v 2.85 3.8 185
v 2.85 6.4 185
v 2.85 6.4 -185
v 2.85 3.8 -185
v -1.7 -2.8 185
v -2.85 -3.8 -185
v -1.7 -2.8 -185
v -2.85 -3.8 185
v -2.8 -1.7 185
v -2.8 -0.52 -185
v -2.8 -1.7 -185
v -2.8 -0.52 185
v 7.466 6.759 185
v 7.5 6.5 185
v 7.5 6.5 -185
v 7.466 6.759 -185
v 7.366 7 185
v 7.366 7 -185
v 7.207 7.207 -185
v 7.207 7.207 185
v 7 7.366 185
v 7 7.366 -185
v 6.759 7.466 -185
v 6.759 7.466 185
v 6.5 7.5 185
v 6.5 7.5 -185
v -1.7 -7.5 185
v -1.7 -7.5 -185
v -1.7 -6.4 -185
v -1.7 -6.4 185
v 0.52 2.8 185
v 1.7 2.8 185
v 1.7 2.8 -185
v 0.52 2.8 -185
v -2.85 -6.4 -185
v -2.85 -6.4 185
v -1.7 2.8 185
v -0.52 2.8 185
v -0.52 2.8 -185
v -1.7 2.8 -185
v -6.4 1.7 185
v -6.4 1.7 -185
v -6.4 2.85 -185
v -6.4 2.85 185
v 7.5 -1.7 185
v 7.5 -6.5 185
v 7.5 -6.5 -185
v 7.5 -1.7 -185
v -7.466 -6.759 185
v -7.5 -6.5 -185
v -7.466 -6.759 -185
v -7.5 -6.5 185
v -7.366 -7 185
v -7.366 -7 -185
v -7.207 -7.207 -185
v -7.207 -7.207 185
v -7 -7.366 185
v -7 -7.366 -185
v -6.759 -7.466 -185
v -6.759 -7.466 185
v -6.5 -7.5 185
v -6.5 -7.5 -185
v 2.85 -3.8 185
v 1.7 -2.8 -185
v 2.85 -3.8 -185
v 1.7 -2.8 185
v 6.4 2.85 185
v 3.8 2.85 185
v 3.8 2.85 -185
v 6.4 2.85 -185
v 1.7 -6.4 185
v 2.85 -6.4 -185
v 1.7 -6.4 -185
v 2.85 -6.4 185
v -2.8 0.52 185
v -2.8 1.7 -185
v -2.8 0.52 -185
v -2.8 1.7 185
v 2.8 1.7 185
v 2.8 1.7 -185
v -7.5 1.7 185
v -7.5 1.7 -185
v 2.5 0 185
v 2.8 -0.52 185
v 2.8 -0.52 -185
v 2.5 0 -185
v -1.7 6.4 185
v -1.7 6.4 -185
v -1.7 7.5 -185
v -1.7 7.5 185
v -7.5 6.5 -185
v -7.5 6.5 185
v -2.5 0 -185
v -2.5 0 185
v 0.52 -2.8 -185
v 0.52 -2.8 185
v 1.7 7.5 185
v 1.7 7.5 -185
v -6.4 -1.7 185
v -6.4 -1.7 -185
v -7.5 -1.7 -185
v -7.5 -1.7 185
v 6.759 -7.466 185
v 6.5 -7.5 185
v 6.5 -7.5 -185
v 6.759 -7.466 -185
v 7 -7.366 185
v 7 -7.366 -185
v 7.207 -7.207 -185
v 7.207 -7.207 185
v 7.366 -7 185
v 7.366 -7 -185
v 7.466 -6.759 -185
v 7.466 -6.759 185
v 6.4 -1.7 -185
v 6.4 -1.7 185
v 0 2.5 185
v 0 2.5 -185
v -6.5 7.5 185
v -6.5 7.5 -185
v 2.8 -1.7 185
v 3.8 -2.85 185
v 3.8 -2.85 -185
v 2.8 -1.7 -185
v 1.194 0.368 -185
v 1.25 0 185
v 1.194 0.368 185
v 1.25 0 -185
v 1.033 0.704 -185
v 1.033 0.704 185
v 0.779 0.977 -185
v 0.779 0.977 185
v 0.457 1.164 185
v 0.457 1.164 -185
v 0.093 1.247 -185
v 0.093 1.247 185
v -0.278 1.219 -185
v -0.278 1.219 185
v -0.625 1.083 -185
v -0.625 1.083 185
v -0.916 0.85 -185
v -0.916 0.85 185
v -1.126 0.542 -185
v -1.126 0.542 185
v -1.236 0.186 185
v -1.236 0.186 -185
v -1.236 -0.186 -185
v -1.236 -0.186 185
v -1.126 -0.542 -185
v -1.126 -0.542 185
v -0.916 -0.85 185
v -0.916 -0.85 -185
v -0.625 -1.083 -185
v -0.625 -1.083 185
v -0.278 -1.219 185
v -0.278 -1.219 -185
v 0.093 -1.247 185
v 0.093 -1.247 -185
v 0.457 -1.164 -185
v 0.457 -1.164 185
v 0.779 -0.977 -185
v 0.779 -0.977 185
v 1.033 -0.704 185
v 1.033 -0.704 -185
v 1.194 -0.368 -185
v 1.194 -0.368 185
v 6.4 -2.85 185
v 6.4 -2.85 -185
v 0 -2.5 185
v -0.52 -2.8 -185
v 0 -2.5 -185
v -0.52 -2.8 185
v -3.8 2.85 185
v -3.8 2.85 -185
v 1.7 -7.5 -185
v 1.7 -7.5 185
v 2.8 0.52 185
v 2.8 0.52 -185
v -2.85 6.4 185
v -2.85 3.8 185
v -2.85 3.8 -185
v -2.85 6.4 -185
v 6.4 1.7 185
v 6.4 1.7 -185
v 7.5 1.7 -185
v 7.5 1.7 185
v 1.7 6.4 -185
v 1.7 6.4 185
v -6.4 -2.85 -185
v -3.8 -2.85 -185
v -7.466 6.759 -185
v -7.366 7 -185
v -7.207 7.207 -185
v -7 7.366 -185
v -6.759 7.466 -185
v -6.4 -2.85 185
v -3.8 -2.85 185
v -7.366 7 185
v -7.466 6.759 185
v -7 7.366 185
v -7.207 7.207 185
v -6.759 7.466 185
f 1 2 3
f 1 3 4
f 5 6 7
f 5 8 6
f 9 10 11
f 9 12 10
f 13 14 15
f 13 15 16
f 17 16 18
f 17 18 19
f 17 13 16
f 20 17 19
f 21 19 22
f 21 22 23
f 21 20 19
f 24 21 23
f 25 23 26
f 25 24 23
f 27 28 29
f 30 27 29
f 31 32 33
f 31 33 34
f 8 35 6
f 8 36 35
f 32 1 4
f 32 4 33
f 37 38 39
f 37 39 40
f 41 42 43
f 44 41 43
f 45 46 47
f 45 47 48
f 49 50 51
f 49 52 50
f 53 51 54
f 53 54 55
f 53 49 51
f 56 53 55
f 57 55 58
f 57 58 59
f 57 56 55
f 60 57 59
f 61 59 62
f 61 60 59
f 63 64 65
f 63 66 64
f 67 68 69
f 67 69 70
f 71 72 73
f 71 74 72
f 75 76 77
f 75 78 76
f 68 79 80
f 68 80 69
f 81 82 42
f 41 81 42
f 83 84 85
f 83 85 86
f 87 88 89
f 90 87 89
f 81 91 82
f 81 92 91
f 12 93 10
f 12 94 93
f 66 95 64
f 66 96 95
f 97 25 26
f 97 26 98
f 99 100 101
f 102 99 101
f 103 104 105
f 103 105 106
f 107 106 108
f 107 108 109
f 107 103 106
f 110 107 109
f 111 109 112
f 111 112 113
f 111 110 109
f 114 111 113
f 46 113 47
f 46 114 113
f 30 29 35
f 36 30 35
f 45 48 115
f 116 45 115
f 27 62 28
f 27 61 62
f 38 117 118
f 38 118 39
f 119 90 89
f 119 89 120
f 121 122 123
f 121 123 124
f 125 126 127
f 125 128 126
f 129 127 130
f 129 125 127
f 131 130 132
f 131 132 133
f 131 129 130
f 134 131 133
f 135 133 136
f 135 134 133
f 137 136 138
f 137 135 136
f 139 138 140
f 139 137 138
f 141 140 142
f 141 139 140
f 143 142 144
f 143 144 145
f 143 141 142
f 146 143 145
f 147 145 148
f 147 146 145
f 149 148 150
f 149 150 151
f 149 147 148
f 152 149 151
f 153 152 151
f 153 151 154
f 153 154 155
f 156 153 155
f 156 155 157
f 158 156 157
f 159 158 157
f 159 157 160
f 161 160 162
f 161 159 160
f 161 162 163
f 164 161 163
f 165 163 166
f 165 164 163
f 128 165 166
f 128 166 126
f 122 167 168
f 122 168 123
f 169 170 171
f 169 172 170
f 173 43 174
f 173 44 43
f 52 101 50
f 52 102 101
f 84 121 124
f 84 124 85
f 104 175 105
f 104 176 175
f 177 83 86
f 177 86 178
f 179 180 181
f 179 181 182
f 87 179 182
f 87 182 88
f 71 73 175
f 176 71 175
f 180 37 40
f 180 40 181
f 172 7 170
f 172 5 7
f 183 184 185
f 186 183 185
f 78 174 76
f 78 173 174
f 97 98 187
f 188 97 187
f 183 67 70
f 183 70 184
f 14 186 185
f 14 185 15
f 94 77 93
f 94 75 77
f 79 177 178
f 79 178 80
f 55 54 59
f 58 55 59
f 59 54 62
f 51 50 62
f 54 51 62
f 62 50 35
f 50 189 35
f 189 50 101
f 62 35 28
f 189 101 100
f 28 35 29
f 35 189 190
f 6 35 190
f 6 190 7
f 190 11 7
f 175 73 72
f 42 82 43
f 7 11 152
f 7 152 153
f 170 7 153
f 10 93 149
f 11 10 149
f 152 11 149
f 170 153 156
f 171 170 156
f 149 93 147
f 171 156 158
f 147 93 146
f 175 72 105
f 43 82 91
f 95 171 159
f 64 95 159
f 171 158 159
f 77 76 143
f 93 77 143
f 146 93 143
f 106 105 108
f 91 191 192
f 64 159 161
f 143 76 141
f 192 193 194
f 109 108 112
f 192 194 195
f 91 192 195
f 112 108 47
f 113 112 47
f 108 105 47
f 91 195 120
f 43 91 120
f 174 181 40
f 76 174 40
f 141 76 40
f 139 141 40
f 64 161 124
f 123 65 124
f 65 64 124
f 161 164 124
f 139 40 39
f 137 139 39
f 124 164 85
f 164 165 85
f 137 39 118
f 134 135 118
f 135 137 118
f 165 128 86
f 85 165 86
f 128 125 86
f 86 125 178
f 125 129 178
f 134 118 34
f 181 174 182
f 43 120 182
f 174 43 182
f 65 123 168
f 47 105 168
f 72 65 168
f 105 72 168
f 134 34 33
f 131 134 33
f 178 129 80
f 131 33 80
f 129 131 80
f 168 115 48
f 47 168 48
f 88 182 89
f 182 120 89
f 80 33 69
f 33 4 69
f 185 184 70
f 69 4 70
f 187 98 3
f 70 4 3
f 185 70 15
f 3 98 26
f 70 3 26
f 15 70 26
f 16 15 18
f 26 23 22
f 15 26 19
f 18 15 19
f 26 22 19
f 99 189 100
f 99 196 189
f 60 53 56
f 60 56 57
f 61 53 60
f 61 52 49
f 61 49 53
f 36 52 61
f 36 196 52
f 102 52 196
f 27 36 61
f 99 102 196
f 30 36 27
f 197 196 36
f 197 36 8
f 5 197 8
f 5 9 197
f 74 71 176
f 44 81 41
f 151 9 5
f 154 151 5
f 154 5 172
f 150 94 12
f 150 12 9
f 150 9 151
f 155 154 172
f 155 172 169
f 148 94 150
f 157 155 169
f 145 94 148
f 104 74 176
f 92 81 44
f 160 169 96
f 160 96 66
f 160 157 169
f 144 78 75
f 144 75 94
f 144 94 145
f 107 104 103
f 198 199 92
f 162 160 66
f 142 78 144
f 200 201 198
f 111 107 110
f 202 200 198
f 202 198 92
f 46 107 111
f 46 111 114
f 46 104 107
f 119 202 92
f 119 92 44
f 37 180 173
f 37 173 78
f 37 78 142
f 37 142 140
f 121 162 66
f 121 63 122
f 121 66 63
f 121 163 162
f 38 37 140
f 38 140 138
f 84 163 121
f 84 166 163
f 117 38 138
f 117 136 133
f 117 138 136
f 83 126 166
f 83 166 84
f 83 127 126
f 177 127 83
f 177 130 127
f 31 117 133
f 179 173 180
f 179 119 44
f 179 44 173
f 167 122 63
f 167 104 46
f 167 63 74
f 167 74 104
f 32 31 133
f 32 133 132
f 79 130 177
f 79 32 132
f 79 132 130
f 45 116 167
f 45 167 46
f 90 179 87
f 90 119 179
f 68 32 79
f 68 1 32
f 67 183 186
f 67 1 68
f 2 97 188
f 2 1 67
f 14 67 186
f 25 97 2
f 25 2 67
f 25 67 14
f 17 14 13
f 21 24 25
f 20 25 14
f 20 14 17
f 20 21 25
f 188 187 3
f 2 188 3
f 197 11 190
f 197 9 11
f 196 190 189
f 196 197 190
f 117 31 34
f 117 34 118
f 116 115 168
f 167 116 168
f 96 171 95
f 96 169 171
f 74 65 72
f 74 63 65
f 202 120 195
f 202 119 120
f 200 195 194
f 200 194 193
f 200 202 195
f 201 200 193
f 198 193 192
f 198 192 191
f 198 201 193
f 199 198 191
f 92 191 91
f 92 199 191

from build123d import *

# Parameters (mm, degrees)
F0_R     = 1.25
F1_DEPTH = 185


with BuildPart() as f1:
    # F0 (on Top) → F1 (new body, symmetric)
    with BuildSketch(Plane.XY):
        with BuildLine():
            Line((1.7, -7.5), (6.5, -7.5))
            ThreePointArc((6.5, -7.5), (7.207107, -7.207107), (7.5, -6.5))
            Line((7.5, -6.5), (7.5, -1.7))
            Line((7.5, -1.7), (6.4, -1.7))
            Line((6.4, -1.7), (6.4, -2.85))
            Line((6.4, -2.85), (3.8, -2.85))
            Line((3.8, -2.85), (2.8, -1.7))
            Line((2.8, -1.7), (2.8, -0.519615))
            Line((2.8, -0.519615), (2.5, 0))
            Line((2.5, 0), (2.8, 0.519615))
            Line((2.8, 0.519615), (2.8, 1.7))
            Line((2.8, 1.7), (3.8, 2.85))
            Line((3.8, 2.85), (6.4, 2.85))
            Line((6.4, 2.85), (6.4, 1.7))
            Line((6.4, 1.7), (7.5, 1.7))
            Line((7.5, 1.7), (7.5, 6.5))
            ThreePointArc((7.5, 6.5), (7.207107, 7.207107), (6.5, 7.5))
            Line((6.5, 7.5), (1.7, 7.5))
            Line((1.7, 7.5), (1.7, 6.4))
            Line((1.7, 6.4), (2.85, 6.4))
            Line((2.85, 6.4), (2.85, 3.8))
            Line((2.85, 3.8), (1.7, 2.8))
            Line((1.7, 2.8), (0.519615, 2.8))
            Line((0.519615, 2.8), (0, 2.5))
            Line((0, 2.5), (-0.519615, 2.8))
            Line((-0.519615, 2.8), (-1.7, 2.8))
            Line((-1.7, 2.8), (-2.85, 3.8))
            Line((-2.85, 3.8), (-2.85, 6.4))
            Line((-2.85, 6.4), (-1.7, 6.4))
            Line((-1.7, 6.4), (-1.7, 7.5))
            Line((-1.7, 7.5), (-6.5, 7.5))
            ThreePointArc((-6.5, 7.5), (-7.207107, 7.207107), (-7.5, 6.5))
            Line((-7.5, 6.5), (-7.5, 1.7))
            Line((-7.5, 1.7), (-6.4, 1.7))
            Line((-6.4, 1.7), (-6.4, 2.85))
            Line((-6.4, 2.85), (-3.8, 2.85))
            Line((-3.8, 2.85), (-2.8, 1.7))
            Line((-2.8, 1.7), (-2.8, 0.519615))
            Line((-2.8, 0.519615), (-2.5, 0))
            Line((-2.5, 0), (-2.8, -0.519615))
            Line((-2.8, -0.519615), (-2.8, -1.7))
            Line((-2.8, -1.7), (-3.8, -2.85))
            Line((-3.8, -2.85), (-6.4, -2.85))
            Line((-6.4, -2.85), (-6.4, -1.7))
            Line((-6.4, -1.7), (-7.5, -1.7))
            Line((-7.5, -1.7), (-7.5, -6.5))
            ThreePointArc((-7.5, -6.5), (-7.207107, -7.207107), (-6.5, -7.5))
            Line((-6.5, -7.5), (-1.7, -7.5))
            Line((-1.7, -7.5), (-1.7, -6.4))
            Line((-1.7, -6.4), (-2.85, -6.4))
            Line((-2.85, -6.4), (-2.85, -3.8))
            Line((-2.85, -3.8), (-1.7, -2.8))
            Line((-1.7, -2.8), (-0.519615, -2.8))
            Line((-0.519615, -2.8), (0, -2.5))
            Line((0, -2.5), (0.519615, -2.8))
            Line((0.519615, -2.8), (1.7, -2.8))
            Line((1.7, -2.8), (2.85, -3.8))
            Line((2.85, -3.8), (2.85, -6.4))
            Line((2.85, -6.4), (1.7, -6.4))
            Line((1.7, -6.4), (1.7, -7.5))
        make_face()
        Circle(F0_R, mode=Mode.SUBTRACT)
    extrude(amount=F1_DEPTH, both=True)


solid = f1.part
